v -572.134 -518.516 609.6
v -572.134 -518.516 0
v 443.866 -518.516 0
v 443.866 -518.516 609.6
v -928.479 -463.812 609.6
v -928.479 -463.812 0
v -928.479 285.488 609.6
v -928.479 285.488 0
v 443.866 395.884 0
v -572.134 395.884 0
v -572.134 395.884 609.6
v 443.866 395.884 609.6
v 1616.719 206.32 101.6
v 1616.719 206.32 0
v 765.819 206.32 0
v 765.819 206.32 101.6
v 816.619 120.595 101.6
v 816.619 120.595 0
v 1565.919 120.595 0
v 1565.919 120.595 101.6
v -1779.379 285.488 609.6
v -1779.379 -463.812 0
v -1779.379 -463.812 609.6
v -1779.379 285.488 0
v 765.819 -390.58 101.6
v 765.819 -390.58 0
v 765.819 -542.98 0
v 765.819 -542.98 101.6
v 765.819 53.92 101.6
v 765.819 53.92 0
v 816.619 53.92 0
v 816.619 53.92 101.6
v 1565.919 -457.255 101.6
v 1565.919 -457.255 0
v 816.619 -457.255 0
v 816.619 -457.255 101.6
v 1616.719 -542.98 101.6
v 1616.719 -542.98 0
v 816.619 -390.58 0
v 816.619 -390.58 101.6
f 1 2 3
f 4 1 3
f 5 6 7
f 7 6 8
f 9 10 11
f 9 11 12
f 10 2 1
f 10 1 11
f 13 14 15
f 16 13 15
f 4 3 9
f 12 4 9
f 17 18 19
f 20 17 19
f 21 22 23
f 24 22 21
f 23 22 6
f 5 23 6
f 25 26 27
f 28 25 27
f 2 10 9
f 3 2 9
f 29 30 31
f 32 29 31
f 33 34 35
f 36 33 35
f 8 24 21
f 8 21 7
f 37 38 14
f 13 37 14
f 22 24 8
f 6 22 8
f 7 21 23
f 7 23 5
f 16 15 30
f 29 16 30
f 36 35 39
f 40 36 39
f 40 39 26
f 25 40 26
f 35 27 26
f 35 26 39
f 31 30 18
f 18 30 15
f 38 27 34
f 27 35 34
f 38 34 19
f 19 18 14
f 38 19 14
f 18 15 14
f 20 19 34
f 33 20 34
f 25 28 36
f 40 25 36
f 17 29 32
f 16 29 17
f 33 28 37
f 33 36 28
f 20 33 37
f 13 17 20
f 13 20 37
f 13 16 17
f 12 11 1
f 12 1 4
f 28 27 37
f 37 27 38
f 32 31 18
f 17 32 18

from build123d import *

# Parameters (mm, degrees)
F0_W     = 1016
F0_H     = 914.4
F1_DEPTH = 609.6
F2_W     = 850.9
F2_H     = 749.3
F3_DEPTH = 609.6
F5_DEPTH = 101.6


with BuildPart() as f1:
    # F0 (on Top) → F1 (new body)
    with BuildSketch(Plane.XY):
        with Locations((-64.1343, -61.316494)):
            Rectangle(F0_W, F0_H)
    extrude(amount=F1_DEPTH)


with BuildPart() as f3:
    # F2 (on Top) → F3 (new body)
    with BuildSketch(Plane.XY):
        with Locations((-1353.928777, -89.16247)):
            Rectangle(F2_W, F2_H)
    extrude(amount=F3_DEPTH)


with BuildPart() as f5:
    # F4 (on Top) → F5 (new body)
    with BuildSketch(Plane.XY):
        Polygon((1616.719279, 206.319807), (765.819279, 206.319807), (765.819279, 53.919807), (816.619279, 53.919807), (816.619279, 120.594807), (1565.919279, 120.594807), (1565.919279, -457.255193), (816.619279, -457.255193), (816.619279, -390.580193), (765.819279, -390.580193), (765.819279, -542.980193), (1616.719279, -542.980193), align=None)
    extrude(amount=F5_DEPTH)


solid = Compound([f1.part, f3.part, f5.part])
